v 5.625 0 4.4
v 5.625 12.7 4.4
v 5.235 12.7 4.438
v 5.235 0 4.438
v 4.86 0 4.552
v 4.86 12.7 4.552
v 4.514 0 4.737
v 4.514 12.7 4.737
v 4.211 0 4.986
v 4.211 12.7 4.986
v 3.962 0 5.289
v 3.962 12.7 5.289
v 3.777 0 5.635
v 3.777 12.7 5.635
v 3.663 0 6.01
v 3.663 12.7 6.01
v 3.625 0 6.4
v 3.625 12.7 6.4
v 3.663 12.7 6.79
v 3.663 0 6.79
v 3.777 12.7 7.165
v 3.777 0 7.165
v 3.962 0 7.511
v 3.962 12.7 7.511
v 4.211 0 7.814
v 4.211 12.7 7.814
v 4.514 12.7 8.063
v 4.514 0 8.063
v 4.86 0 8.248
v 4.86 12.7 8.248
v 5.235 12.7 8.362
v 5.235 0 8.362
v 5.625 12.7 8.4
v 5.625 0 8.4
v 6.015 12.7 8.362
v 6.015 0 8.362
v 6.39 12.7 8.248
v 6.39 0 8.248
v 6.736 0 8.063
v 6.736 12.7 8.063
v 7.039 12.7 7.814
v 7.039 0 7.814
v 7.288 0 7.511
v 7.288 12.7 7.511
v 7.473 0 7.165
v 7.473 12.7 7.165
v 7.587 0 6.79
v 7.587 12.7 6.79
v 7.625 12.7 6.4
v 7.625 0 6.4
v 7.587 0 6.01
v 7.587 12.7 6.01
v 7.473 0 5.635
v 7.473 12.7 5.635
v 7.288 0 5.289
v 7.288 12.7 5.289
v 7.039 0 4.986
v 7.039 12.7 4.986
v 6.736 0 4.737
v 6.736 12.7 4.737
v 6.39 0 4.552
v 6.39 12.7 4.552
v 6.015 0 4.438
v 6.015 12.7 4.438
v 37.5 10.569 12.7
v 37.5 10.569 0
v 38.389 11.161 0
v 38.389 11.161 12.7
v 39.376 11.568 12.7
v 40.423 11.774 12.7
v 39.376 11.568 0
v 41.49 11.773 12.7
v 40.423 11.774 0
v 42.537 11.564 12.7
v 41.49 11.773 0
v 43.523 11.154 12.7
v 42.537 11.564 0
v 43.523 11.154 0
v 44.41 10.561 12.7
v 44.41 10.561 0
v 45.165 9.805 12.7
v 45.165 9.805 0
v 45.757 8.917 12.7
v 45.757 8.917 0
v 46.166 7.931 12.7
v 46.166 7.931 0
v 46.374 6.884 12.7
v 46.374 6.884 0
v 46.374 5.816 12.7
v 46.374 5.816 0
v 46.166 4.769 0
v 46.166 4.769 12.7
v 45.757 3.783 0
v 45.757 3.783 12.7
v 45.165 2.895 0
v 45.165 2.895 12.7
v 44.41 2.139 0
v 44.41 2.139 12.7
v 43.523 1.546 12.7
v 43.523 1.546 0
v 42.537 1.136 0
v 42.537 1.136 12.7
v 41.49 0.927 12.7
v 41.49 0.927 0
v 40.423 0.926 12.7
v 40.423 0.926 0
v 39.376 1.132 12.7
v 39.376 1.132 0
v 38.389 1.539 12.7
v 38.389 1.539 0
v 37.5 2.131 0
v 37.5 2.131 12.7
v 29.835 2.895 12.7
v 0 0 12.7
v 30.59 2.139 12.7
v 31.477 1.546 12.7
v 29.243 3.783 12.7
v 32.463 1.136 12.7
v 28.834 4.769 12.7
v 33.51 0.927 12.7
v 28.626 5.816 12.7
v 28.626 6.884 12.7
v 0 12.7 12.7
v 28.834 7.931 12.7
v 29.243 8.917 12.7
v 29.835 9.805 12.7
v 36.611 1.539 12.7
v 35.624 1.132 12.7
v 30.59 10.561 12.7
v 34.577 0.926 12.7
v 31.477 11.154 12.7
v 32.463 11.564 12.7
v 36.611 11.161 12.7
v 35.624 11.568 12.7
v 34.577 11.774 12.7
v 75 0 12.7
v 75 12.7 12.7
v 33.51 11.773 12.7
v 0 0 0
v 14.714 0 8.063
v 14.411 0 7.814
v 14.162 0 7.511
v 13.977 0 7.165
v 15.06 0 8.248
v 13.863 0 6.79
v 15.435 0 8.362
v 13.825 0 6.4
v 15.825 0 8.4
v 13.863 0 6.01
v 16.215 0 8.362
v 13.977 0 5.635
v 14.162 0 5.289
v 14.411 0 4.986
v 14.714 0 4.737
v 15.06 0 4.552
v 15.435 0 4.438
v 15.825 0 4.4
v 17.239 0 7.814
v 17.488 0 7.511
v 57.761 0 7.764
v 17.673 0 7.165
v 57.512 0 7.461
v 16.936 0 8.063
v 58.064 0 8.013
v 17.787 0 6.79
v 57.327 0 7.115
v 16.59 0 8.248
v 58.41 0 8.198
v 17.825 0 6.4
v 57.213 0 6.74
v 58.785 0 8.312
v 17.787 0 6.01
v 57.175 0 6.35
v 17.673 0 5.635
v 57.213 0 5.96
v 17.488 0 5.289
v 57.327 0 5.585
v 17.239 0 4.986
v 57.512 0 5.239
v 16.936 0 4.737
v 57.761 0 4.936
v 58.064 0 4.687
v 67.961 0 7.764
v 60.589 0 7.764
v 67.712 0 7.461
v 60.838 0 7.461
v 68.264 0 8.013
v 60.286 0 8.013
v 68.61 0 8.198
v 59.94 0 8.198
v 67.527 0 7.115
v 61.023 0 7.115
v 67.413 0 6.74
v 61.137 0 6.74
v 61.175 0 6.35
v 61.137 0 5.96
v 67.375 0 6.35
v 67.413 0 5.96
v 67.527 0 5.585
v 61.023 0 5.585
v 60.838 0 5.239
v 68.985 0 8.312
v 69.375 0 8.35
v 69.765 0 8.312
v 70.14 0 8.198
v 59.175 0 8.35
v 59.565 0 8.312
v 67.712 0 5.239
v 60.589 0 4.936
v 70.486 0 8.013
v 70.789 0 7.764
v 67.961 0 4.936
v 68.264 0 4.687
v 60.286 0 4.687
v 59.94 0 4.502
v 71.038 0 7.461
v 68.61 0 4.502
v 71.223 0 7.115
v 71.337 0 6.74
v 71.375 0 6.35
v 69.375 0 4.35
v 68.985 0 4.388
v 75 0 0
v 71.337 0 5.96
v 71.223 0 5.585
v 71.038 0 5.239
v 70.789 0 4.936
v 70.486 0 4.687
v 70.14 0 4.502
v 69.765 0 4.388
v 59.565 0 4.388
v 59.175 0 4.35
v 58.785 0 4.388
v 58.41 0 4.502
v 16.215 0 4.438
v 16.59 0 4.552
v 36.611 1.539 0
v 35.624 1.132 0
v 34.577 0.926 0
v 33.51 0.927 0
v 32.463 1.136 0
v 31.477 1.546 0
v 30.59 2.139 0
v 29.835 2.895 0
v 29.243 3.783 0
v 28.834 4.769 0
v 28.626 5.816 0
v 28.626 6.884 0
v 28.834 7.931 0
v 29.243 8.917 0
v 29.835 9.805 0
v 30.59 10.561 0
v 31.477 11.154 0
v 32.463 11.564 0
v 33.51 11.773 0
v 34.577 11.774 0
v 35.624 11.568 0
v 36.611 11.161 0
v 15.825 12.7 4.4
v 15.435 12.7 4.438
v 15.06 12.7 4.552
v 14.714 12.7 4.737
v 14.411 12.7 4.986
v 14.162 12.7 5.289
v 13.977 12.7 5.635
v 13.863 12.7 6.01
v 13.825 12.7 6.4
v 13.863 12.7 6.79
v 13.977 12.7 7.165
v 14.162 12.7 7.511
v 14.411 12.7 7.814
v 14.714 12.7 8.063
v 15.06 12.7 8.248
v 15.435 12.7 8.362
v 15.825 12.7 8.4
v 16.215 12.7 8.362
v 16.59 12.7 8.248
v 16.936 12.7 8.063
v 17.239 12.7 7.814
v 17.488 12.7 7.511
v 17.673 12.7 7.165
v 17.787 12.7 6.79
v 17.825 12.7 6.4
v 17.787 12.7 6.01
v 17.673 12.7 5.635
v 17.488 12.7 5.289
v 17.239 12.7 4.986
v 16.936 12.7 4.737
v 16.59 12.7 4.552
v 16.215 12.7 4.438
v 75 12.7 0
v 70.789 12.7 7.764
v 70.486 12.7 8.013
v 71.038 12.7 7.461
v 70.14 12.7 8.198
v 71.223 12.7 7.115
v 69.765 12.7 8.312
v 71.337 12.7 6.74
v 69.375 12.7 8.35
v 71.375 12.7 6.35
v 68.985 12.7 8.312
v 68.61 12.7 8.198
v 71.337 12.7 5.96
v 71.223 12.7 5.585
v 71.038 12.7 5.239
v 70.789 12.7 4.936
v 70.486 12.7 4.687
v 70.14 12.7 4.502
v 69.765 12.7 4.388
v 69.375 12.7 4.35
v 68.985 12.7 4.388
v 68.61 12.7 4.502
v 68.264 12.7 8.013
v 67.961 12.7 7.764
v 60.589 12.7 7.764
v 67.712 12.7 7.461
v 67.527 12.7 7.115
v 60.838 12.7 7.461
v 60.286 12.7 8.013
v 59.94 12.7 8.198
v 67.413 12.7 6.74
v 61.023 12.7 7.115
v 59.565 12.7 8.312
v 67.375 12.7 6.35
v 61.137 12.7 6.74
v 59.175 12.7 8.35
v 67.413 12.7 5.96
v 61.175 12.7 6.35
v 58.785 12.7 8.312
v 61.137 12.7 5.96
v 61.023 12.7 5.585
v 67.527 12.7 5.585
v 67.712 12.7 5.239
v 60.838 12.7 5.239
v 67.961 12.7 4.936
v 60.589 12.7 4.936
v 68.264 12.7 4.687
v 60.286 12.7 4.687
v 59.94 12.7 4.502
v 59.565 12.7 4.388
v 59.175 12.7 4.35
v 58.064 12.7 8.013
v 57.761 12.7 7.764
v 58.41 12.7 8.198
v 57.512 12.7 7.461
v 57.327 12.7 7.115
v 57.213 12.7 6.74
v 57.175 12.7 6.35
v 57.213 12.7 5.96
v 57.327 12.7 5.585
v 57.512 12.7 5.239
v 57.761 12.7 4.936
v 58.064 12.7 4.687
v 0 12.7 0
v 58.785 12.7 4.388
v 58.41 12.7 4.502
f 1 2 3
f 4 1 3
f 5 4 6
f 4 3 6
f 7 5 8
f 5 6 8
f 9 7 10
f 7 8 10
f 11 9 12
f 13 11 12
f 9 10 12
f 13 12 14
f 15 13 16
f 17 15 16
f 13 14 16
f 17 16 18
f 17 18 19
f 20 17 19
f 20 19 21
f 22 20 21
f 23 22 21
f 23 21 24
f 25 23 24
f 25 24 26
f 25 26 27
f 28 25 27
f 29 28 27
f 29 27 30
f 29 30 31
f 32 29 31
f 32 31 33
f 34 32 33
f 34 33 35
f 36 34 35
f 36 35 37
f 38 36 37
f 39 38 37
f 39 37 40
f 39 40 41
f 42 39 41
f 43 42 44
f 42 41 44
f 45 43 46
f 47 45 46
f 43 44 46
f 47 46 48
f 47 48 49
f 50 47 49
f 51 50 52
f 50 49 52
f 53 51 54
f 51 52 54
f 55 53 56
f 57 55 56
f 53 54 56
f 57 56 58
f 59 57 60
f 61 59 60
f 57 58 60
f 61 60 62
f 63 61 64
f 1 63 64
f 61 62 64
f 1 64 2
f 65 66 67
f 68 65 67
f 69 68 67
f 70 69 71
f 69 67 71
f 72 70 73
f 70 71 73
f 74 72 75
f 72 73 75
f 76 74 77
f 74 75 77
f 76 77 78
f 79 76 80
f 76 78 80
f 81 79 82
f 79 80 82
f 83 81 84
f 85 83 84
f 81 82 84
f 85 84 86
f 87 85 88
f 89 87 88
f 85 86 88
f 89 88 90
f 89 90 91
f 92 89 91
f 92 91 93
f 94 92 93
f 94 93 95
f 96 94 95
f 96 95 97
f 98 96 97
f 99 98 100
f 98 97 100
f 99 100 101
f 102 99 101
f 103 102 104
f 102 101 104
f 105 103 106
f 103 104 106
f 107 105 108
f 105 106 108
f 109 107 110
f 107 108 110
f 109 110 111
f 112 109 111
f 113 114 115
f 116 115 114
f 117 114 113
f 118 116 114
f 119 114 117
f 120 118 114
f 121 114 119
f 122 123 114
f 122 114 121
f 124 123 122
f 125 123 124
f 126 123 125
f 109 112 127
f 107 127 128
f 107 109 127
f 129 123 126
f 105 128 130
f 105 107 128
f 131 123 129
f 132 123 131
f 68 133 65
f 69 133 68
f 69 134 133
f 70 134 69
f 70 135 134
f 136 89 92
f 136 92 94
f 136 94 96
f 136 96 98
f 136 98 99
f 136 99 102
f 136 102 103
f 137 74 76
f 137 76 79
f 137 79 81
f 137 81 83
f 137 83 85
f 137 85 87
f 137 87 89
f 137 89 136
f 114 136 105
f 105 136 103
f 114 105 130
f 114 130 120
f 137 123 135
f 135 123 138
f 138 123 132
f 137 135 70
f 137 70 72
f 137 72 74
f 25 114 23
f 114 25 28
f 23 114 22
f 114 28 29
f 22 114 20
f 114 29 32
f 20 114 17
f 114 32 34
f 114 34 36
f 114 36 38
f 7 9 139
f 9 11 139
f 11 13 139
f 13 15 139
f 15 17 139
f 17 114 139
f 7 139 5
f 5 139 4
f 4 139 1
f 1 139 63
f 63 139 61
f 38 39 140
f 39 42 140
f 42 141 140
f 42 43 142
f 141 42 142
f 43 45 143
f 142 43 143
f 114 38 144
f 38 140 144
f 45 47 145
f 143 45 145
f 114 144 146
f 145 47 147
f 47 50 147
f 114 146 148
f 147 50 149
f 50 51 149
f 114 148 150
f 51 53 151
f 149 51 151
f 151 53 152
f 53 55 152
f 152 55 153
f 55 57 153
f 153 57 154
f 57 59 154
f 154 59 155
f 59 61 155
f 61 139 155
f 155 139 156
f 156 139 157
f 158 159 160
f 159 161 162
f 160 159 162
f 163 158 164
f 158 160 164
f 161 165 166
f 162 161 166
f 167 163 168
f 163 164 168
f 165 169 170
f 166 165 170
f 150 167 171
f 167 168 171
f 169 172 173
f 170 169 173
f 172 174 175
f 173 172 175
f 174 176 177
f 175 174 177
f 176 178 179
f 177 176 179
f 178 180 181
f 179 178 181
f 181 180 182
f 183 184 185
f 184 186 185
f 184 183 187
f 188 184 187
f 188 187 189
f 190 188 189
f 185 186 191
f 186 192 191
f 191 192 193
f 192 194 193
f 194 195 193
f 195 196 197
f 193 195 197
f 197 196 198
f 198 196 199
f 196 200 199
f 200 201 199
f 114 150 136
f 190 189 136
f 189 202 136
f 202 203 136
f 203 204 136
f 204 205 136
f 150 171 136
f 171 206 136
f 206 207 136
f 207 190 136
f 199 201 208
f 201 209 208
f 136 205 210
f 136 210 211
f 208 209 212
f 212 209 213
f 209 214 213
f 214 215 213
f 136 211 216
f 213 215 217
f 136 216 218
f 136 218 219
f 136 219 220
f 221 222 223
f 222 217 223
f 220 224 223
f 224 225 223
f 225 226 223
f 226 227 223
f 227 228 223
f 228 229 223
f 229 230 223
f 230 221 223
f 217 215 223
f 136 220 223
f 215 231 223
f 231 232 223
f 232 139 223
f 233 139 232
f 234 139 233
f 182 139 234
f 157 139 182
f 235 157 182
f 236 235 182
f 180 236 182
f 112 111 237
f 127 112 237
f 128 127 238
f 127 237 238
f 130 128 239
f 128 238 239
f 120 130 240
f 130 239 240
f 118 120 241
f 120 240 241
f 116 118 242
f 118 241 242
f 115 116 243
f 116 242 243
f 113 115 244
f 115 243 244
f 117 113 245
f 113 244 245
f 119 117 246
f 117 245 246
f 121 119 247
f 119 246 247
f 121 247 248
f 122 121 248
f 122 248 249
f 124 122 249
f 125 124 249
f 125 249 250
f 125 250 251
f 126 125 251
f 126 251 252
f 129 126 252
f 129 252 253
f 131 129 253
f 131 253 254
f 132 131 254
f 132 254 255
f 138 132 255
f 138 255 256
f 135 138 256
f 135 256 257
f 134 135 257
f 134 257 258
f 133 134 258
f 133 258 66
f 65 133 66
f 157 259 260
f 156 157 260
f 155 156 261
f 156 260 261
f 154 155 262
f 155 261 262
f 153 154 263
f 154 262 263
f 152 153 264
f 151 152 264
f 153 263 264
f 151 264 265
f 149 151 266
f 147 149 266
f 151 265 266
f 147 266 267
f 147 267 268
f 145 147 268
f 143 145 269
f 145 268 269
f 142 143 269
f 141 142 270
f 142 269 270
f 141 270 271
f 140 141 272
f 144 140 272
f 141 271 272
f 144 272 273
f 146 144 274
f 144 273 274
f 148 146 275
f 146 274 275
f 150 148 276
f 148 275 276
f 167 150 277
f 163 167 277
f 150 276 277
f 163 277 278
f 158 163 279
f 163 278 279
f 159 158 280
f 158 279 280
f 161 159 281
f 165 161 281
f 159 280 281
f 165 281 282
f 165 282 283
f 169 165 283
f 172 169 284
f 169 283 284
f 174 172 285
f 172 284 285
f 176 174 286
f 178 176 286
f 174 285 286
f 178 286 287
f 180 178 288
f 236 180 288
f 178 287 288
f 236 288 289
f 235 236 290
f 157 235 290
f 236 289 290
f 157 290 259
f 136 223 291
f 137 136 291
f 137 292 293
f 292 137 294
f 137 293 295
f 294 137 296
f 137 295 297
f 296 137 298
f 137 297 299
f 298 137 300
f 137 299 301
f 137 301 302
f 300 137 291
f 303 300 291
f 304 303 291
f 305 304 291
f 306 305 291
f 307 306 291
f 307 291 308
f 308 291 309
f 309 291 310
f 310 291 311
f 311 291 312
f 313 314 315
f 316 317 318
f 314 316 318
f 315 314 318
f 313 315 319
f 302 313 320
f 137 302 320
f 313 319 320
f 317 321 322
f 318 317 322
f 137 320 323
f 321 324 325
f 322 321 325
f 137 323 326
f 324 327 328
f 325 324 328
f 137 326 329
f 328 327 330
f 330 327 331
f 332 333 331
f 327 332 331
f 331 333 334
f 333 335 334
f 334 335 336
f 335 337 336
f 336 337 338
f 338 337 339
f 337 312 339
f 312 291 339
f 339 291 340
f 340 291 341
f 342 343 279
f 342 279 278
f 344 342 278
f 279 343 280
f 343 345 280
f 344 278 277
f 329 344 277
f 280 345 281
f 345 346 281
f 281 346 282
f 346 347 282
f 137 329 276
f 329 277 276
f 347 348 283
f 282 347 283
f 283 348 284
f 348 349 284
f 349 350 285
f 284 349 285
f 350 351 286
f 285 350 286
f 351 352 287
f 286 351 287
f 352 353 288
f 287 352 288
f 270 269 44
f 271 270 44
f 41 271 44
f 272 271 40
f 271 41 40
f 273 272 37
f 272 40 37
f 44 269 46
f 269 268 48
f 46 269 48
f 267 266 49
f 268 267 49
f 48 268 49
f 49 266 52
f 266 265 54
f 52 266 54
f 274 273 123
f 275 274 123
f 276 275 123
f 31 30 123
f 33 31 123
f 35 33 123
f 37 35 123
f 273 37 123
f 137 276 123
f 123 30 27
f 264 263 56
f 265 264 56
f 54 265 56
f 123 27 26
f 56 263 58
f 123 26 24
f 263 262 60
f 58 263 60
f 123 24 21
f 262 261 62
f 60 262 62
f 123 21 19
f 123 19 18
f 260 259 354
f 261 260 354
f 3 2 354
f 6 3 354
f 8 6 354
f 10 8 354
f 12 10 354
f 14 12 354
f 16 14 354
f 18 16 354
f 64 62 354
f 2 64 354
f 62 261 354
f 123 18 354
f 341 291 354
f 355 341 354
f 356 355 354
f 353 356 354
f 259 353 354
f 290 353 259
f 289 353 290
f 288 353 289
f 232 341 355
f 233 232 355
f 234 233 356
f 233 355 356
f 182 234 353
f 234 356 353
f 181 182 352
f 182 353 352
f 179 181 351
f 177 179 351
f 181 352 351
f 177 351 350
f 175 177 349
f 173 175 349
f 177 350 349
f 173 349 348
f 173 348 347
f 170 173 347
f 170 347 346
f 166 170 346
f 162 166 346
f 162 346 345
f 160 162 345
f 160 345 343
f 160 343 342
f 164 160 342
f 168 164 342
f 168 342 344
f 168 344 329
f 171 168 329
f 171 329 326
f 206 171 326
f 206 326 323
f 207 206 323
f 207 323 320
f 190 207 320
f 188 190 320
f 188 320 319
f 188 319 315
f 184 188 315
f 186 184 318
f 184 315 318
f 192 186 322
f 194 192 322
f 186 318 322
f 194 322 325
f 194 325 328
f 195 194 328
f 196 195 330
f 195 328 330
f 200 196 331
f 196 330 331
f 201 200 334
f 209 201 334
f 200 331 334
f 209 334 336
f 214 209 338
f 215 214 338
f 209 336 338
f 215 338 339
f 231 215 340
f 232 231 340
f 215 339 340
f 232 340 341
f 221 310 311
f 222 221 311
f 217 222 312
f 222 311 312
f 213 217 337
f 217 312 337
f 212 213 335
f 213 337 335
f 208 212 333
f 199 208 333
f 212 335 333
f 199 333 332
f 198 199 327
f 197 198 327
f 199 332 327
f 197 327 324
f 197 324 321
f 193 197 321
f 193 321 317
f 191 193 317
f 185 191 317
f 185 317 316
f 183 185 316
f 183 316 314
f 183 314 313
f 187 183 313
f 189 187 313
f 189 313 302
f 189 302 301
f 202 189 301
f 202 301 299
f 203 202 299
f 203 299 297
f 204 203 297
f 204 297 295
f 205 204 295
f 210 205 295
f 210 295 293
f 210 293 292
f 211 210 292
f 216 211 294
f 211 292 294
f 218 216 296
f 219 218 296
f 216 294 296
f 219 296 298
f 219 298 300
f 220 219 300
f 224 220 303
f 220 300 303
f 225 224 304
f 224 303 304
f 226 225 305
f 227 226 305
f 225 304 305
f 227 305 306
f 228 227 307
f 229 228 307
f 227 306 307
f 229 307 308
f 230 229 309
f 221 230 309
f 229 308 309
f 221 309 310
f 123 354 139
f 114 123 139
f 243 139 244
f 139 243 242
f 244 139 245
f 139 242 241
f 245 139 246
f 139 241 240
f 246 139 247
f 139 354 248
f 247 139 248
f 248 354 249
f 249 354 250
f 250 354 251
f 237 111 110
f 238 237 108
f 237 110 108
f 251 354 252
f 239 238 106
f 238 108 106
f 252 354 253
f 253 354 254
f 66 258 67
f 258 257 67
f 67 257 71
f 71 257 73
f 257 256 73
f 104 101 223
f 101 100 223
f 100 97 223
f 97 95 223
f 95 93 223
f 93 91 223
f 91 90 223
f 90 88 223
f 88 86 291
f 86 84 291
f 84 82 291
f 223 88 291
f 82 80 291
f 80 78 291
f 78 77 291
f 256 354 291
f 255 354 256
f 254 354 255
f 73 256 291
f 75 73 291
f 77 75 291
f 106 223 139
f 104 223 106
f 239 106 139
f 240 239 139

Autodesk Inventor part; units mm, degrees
ref_plane "YZ Plane" through (0, 0, 0) normal (1, 0, 0) x (0, 1, 0)
ref_plane "XZ Plane" through (0, 0, 0) normal (0, 1, 0) x (-1, 0, 0)
ref_plane "XY Plane" through (0, 0, 0) normal (0, 0, 1) x (1, 0, 0)
sketch "Boceto1" plane through (0, 0, 0) normal (0, 0, 1) x (1, 0, 0)
  line L0 (0, 0) -> (75, 0)
  line L1 (75, 0) -> (75, 12.7)
  line L2 (75, 12.7) -> (0, 12.7)
  line L3 (0, 12.7) -> (0, 0)
  dimension "d0" = 75
  dimension "d1" = 12.7
extrude "Extrusión1" add sketch "Boceto1" along normal blind 12.7
sketch "Boceto2" plane through (0, 0, 0) normal (0, 0, -1) x (-1, 0, 0)
  line L0 (0, 12.7) -> (0, 0) projected
  line L1 (0, 6.35) -> (-28.6, 6.35)
  line L2 (-28.6, 6.35) -> (-34.05, 6.35)
  line L3 (-28.6, 6.35) -> (-23.15, 6.35) construction
  circle A0 centre (-34.05, 6.35) radius 5.45
  line L4 (-75, 6.35) -> (-46.4, 6.35)
  line L5 (-46.4, 6.35) -> (-40.95, 6.35)
  line L6 (-46.4, 6.35) -> (-51.85, 6.35) construction
  circle A1 centre (-40.95, 6.35) radius 5.45
  point P0 (-37.5, 2.131)
  point P1 (-37.5, 10.569)
  dimension "d4" = 28.6
  dimension "d5" = 5.45
  dimension "d6" = 180
  dimension "d7" = 28.6
  dimension "d8" = 5.45
  dimension "d9" = 180
extrude "Extrusión2" cut sketch "Boceto2" against normal blind 12.7
sketch "Boceto3" plane through (0, 0, 0) normal (0, -1, 0) x (1, 0, 0)
  line L0 (75, 0) -> (75, 12.7) projected
  line L1 (75, 6.35) -> (71.1, 6.35)
  line L2 (71.1, 6.35) -> (69.375, 6.35)
  circle A0 centre (69.375, 6.35) radius 1.725
  line L3 (67.65, 6.35) -> (60.9, 6.35)
  line L4 (60.9, 6.35) -> (59.175, 6.35)
  circle A1 centre (59.175, 6.35) radius 1.725
  circle A2 centre (69.375, 6.35) radius 2
  circle A3 centre (59.175, 6.35) radius 2
  line L5 (75, 0) -> (0, 0) projected
  line L6 (37.5, 0) -> (37.5, 12.7)
  line L7 (0, 12.7) -> (75, 12.7) projected
  line L8 (0, 6.4) -> (3.9, 6.4)
  line L9 (3.9, 6.4) -> (5.625, 6.4)
  circle A4 centre (5.625, 6.4) radius 1.725
  line L10 (7.35, 6.4) -> (14.1, 6.4)
  line L11 (14.1, 6.4) -> (15.825, 6.4)
  circle A5 centre (15.825, 6.4) radius 1.725
  circle A6 centre (5.625, 6.4) radius 2
  circle A7 centre (15.825, 6.4) radius 2
  line L12 (0, 0) -> (75, 0) projected
  dimension "d12" = 3.9
  dimension "d13" = 1.725
  dimension "d14" = 6.75
  dimension "d15" = 1.725
  dimension "d16" = 4
  dimension "d17" = 4
  dimension "d18" = 3.9
  dimension "d19" = 1.725
  dimension "d20" = 6.75
  dimension "d21" = 1.725
  dimension "d22" = 4
  dimension "d23" = 4
  dimension "d31" = 6.4
  dimension "d32" = 6.4
hole "Agujero1" at (59.175, 0, 6.35) at (69.375, 0, 6.35) at (15.825, 0, 6.4) at (5.625, 0, 6.4) direction (0, 1, 0) diameter 4 depth 12.7
properties part number "Celda_Carga"
